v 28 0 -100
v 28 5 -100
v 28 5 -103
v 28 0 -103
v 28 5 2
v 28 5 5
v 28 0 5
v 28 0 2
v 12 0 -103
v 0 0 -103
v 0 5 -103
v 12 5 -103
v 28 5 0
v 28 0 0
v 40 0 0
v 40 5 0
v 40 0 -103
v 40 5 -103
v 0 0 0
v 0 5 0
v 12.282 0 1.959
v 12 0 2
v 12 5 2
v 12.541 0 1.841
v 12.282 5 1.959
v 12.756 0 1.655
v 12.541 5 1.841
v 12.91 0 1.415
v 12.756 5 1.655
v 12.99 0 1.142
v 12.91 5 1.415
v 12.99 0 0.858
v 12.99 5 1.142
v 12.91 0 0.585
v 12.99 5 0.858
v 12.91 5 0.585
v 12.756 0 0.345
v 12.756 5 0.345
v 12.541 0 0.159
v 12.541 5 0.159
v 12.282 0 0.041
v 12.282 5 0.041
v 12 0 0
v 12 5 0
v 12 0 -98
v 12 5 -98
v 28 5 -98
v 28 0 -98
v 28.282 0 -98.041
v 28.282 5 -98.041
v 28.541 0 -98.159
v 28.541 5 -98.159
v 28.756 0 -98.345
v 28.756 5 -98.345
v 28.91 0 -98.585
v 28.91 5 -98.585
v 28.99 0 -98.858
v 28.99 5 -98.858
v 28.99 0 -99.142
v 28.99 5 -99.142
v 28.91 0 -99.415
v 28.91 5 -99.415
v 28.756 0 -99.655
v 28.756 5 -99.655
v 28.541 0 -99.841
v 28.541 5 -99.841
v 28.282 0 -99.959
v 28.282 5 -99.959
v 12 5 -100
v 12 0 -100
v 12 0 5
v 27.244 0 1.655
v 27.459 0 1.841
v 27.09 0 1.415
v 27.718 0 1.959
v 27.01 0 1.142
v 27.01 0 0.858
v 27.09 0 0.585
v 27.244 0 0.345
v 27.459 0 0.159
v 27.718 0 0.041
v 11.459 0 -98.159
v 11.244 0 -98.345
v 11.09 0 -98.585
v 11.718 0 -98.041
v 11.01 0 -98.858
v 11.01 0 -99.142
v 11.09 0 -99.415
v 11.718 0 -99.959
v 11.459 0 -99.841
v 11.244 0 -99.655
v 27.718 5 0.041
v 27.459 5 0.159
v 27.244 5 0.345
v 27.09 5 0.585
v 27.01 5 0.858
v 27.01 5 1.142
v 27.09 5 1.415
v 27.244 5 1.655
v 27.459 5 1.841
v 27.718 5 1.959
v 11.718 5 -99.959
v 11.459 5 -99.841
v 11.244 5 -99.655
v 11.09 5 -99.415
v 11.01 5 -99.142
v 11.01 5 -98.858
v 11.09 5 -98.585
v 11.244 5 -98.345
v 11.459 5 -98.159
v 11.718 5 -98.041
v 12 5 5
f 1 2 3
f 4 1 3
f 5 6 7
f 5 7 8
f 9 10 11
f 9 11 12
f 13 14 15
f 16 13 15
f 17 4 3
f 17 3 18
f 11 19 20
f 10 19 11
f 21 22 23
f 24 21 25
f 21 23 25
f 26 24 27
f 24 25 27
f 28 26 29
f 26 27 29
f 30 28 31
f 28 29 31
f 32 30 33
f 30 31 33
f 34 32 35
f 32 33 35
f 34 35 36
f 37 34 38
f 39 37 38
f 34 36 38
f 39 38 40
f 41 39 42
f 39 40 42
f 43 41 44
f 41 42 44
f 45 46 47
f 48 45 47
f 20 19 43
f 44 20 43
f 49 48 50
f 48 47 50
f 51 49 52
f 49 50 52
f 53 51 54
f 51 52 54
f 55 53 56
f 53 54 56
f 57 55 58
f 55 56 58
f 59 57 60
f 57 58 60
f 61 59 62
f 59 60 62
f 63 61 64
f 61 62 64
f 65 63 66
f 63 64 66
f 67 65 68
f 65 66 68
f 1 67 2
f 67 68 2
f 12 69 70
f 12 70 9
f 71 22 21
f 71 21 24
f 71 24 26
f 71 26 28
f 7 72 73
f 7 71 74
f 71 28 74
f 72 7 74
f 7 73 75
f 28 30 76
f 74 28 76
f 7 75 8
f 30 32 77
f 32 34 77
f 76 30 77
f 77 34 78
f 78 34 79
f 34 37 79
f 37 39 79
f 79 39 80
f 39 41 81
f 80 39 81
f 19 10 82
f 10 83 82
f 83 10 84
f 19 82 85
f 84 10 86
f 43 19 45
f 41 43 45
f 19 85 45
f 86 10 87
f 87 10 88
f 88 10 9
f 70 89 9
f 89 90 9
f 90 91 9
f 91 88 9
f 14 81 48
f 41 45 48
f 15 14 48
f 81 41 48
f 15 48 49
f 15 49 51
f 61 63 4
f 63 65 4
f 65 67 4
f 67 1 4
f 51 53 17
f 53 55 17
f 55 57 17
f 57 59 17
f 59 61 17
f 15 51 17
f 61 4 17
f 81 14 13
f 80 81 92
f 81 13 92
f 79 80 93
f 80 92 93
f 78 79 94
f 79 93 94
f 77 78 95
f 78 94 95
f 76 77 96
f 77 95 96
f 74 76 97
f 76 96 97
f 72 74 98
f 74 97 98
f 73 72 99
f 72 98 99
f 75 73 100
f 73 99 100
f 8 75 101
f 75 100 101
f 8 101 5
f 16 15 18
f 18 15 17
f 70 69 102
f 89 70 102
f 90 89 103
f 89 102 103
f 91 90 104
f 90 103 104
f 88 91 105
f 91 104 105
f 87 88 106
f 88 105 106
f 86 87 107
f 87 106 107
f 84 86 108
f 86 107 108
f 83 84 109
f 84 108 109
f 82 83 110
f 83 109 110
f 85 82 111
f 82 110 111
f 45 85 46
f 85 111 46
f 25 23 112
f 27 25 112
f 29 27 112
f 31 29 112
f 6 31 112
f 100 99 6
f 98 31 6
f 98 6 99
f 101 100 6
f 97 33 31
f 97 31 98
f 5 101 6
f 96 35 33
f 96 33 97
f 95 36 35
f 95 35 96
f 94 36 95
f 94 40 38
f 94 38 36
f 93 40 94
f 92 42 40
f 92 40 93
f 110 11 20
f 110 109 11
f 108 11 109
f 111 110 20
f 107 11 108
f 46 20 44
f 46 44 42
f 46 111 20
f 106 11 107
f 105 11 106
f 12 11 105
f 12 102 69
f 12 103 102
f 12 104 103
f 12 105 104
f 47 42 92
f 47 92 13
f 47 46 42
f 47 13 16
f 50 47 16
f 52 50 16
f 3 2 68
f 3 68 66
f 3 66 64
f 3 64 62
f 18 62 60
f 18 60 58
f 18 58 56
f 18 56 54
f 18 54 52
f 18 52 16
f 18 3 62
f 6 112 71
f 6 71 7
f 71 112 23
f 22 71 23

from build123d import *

# Parameters (mm, degrees)
SKETCH_1_W          = 40
SKETCH_1_H          = 103
EXTRUDE_1_DEPTH     = 5
SKETCH_2_W          = 16
SKETCH_2_H          = 5
CUT_EXTRUDE_2_DEPTH = 5
SKETCH_3_W          = 16
SKETCH_3_H          = 5
EXTRUDE_3_DEPTH     = 5
SKETCH_4_R          = 1
CUT_EXTRUDE_3_DEPTH = 10


with BuildPart() as part:
    # 스케치1 → 보스-돌출1 (new body)
    with BuildSketch(Plane(origin=(0, 0, 0), x_dir=(1, 0, 0), z_dir=(0, 1, 0))):
        with Locations((20, 51.5)):
            Rectangle(SKETCH_1_W, SKETCH_1_H)
    extrude(amount=EXTRUDE_1_DEPTH)

    # 스케치2 → 컷-돌출2 (cut)
    with BuildSketch(Plane(origin=(0, 5, 0), x_dir=(1, 0, 0), z_dir=(0, 1, 0))):
        with Locations((20, 100.5)):
            Rectangle(SKETCH_2_W, SKETCH_2_H)
    extrude(amount=-CUT_EXTRUDE_2_DEPTH, mode=Mode.SUBTRACT)

    # 스케치3 → 보스-돌출3 (add)
    with BuildSketch(Plane(origin=(0, 5, 0), x_dir=(1, 0, 0), z_dir=(0, 1, 0))):
        with Locations((20, -2.5)):
            Rectangle(SKETCH_3_W, SKETCH_3_H)
    extrude(amount=-EXTRUDE_3_DEPTH)

    # 스케치4 → 컷-돌출3 (cut)
    with BuildSketch(Plane(origin=(0, 5, 0), x_dir=(1, 0, 0), z_dir=(0, 1, 0))):
        with Locations((28, -1)):
            Circle(SKETCH_4_R)
        with Locations((12, -1)):
            Circle(SKETCH_4_R)
        with Locations((12, 99)):
            Circle(SKETCH_4_R)
        with Locations((28, 99)):
            Circle(SKETCH_4_R)
    extrude(amount=-CUT_EXTRUDE_3_DEPTH, mode=Mode.SUBTRACT)


solid = part.part
